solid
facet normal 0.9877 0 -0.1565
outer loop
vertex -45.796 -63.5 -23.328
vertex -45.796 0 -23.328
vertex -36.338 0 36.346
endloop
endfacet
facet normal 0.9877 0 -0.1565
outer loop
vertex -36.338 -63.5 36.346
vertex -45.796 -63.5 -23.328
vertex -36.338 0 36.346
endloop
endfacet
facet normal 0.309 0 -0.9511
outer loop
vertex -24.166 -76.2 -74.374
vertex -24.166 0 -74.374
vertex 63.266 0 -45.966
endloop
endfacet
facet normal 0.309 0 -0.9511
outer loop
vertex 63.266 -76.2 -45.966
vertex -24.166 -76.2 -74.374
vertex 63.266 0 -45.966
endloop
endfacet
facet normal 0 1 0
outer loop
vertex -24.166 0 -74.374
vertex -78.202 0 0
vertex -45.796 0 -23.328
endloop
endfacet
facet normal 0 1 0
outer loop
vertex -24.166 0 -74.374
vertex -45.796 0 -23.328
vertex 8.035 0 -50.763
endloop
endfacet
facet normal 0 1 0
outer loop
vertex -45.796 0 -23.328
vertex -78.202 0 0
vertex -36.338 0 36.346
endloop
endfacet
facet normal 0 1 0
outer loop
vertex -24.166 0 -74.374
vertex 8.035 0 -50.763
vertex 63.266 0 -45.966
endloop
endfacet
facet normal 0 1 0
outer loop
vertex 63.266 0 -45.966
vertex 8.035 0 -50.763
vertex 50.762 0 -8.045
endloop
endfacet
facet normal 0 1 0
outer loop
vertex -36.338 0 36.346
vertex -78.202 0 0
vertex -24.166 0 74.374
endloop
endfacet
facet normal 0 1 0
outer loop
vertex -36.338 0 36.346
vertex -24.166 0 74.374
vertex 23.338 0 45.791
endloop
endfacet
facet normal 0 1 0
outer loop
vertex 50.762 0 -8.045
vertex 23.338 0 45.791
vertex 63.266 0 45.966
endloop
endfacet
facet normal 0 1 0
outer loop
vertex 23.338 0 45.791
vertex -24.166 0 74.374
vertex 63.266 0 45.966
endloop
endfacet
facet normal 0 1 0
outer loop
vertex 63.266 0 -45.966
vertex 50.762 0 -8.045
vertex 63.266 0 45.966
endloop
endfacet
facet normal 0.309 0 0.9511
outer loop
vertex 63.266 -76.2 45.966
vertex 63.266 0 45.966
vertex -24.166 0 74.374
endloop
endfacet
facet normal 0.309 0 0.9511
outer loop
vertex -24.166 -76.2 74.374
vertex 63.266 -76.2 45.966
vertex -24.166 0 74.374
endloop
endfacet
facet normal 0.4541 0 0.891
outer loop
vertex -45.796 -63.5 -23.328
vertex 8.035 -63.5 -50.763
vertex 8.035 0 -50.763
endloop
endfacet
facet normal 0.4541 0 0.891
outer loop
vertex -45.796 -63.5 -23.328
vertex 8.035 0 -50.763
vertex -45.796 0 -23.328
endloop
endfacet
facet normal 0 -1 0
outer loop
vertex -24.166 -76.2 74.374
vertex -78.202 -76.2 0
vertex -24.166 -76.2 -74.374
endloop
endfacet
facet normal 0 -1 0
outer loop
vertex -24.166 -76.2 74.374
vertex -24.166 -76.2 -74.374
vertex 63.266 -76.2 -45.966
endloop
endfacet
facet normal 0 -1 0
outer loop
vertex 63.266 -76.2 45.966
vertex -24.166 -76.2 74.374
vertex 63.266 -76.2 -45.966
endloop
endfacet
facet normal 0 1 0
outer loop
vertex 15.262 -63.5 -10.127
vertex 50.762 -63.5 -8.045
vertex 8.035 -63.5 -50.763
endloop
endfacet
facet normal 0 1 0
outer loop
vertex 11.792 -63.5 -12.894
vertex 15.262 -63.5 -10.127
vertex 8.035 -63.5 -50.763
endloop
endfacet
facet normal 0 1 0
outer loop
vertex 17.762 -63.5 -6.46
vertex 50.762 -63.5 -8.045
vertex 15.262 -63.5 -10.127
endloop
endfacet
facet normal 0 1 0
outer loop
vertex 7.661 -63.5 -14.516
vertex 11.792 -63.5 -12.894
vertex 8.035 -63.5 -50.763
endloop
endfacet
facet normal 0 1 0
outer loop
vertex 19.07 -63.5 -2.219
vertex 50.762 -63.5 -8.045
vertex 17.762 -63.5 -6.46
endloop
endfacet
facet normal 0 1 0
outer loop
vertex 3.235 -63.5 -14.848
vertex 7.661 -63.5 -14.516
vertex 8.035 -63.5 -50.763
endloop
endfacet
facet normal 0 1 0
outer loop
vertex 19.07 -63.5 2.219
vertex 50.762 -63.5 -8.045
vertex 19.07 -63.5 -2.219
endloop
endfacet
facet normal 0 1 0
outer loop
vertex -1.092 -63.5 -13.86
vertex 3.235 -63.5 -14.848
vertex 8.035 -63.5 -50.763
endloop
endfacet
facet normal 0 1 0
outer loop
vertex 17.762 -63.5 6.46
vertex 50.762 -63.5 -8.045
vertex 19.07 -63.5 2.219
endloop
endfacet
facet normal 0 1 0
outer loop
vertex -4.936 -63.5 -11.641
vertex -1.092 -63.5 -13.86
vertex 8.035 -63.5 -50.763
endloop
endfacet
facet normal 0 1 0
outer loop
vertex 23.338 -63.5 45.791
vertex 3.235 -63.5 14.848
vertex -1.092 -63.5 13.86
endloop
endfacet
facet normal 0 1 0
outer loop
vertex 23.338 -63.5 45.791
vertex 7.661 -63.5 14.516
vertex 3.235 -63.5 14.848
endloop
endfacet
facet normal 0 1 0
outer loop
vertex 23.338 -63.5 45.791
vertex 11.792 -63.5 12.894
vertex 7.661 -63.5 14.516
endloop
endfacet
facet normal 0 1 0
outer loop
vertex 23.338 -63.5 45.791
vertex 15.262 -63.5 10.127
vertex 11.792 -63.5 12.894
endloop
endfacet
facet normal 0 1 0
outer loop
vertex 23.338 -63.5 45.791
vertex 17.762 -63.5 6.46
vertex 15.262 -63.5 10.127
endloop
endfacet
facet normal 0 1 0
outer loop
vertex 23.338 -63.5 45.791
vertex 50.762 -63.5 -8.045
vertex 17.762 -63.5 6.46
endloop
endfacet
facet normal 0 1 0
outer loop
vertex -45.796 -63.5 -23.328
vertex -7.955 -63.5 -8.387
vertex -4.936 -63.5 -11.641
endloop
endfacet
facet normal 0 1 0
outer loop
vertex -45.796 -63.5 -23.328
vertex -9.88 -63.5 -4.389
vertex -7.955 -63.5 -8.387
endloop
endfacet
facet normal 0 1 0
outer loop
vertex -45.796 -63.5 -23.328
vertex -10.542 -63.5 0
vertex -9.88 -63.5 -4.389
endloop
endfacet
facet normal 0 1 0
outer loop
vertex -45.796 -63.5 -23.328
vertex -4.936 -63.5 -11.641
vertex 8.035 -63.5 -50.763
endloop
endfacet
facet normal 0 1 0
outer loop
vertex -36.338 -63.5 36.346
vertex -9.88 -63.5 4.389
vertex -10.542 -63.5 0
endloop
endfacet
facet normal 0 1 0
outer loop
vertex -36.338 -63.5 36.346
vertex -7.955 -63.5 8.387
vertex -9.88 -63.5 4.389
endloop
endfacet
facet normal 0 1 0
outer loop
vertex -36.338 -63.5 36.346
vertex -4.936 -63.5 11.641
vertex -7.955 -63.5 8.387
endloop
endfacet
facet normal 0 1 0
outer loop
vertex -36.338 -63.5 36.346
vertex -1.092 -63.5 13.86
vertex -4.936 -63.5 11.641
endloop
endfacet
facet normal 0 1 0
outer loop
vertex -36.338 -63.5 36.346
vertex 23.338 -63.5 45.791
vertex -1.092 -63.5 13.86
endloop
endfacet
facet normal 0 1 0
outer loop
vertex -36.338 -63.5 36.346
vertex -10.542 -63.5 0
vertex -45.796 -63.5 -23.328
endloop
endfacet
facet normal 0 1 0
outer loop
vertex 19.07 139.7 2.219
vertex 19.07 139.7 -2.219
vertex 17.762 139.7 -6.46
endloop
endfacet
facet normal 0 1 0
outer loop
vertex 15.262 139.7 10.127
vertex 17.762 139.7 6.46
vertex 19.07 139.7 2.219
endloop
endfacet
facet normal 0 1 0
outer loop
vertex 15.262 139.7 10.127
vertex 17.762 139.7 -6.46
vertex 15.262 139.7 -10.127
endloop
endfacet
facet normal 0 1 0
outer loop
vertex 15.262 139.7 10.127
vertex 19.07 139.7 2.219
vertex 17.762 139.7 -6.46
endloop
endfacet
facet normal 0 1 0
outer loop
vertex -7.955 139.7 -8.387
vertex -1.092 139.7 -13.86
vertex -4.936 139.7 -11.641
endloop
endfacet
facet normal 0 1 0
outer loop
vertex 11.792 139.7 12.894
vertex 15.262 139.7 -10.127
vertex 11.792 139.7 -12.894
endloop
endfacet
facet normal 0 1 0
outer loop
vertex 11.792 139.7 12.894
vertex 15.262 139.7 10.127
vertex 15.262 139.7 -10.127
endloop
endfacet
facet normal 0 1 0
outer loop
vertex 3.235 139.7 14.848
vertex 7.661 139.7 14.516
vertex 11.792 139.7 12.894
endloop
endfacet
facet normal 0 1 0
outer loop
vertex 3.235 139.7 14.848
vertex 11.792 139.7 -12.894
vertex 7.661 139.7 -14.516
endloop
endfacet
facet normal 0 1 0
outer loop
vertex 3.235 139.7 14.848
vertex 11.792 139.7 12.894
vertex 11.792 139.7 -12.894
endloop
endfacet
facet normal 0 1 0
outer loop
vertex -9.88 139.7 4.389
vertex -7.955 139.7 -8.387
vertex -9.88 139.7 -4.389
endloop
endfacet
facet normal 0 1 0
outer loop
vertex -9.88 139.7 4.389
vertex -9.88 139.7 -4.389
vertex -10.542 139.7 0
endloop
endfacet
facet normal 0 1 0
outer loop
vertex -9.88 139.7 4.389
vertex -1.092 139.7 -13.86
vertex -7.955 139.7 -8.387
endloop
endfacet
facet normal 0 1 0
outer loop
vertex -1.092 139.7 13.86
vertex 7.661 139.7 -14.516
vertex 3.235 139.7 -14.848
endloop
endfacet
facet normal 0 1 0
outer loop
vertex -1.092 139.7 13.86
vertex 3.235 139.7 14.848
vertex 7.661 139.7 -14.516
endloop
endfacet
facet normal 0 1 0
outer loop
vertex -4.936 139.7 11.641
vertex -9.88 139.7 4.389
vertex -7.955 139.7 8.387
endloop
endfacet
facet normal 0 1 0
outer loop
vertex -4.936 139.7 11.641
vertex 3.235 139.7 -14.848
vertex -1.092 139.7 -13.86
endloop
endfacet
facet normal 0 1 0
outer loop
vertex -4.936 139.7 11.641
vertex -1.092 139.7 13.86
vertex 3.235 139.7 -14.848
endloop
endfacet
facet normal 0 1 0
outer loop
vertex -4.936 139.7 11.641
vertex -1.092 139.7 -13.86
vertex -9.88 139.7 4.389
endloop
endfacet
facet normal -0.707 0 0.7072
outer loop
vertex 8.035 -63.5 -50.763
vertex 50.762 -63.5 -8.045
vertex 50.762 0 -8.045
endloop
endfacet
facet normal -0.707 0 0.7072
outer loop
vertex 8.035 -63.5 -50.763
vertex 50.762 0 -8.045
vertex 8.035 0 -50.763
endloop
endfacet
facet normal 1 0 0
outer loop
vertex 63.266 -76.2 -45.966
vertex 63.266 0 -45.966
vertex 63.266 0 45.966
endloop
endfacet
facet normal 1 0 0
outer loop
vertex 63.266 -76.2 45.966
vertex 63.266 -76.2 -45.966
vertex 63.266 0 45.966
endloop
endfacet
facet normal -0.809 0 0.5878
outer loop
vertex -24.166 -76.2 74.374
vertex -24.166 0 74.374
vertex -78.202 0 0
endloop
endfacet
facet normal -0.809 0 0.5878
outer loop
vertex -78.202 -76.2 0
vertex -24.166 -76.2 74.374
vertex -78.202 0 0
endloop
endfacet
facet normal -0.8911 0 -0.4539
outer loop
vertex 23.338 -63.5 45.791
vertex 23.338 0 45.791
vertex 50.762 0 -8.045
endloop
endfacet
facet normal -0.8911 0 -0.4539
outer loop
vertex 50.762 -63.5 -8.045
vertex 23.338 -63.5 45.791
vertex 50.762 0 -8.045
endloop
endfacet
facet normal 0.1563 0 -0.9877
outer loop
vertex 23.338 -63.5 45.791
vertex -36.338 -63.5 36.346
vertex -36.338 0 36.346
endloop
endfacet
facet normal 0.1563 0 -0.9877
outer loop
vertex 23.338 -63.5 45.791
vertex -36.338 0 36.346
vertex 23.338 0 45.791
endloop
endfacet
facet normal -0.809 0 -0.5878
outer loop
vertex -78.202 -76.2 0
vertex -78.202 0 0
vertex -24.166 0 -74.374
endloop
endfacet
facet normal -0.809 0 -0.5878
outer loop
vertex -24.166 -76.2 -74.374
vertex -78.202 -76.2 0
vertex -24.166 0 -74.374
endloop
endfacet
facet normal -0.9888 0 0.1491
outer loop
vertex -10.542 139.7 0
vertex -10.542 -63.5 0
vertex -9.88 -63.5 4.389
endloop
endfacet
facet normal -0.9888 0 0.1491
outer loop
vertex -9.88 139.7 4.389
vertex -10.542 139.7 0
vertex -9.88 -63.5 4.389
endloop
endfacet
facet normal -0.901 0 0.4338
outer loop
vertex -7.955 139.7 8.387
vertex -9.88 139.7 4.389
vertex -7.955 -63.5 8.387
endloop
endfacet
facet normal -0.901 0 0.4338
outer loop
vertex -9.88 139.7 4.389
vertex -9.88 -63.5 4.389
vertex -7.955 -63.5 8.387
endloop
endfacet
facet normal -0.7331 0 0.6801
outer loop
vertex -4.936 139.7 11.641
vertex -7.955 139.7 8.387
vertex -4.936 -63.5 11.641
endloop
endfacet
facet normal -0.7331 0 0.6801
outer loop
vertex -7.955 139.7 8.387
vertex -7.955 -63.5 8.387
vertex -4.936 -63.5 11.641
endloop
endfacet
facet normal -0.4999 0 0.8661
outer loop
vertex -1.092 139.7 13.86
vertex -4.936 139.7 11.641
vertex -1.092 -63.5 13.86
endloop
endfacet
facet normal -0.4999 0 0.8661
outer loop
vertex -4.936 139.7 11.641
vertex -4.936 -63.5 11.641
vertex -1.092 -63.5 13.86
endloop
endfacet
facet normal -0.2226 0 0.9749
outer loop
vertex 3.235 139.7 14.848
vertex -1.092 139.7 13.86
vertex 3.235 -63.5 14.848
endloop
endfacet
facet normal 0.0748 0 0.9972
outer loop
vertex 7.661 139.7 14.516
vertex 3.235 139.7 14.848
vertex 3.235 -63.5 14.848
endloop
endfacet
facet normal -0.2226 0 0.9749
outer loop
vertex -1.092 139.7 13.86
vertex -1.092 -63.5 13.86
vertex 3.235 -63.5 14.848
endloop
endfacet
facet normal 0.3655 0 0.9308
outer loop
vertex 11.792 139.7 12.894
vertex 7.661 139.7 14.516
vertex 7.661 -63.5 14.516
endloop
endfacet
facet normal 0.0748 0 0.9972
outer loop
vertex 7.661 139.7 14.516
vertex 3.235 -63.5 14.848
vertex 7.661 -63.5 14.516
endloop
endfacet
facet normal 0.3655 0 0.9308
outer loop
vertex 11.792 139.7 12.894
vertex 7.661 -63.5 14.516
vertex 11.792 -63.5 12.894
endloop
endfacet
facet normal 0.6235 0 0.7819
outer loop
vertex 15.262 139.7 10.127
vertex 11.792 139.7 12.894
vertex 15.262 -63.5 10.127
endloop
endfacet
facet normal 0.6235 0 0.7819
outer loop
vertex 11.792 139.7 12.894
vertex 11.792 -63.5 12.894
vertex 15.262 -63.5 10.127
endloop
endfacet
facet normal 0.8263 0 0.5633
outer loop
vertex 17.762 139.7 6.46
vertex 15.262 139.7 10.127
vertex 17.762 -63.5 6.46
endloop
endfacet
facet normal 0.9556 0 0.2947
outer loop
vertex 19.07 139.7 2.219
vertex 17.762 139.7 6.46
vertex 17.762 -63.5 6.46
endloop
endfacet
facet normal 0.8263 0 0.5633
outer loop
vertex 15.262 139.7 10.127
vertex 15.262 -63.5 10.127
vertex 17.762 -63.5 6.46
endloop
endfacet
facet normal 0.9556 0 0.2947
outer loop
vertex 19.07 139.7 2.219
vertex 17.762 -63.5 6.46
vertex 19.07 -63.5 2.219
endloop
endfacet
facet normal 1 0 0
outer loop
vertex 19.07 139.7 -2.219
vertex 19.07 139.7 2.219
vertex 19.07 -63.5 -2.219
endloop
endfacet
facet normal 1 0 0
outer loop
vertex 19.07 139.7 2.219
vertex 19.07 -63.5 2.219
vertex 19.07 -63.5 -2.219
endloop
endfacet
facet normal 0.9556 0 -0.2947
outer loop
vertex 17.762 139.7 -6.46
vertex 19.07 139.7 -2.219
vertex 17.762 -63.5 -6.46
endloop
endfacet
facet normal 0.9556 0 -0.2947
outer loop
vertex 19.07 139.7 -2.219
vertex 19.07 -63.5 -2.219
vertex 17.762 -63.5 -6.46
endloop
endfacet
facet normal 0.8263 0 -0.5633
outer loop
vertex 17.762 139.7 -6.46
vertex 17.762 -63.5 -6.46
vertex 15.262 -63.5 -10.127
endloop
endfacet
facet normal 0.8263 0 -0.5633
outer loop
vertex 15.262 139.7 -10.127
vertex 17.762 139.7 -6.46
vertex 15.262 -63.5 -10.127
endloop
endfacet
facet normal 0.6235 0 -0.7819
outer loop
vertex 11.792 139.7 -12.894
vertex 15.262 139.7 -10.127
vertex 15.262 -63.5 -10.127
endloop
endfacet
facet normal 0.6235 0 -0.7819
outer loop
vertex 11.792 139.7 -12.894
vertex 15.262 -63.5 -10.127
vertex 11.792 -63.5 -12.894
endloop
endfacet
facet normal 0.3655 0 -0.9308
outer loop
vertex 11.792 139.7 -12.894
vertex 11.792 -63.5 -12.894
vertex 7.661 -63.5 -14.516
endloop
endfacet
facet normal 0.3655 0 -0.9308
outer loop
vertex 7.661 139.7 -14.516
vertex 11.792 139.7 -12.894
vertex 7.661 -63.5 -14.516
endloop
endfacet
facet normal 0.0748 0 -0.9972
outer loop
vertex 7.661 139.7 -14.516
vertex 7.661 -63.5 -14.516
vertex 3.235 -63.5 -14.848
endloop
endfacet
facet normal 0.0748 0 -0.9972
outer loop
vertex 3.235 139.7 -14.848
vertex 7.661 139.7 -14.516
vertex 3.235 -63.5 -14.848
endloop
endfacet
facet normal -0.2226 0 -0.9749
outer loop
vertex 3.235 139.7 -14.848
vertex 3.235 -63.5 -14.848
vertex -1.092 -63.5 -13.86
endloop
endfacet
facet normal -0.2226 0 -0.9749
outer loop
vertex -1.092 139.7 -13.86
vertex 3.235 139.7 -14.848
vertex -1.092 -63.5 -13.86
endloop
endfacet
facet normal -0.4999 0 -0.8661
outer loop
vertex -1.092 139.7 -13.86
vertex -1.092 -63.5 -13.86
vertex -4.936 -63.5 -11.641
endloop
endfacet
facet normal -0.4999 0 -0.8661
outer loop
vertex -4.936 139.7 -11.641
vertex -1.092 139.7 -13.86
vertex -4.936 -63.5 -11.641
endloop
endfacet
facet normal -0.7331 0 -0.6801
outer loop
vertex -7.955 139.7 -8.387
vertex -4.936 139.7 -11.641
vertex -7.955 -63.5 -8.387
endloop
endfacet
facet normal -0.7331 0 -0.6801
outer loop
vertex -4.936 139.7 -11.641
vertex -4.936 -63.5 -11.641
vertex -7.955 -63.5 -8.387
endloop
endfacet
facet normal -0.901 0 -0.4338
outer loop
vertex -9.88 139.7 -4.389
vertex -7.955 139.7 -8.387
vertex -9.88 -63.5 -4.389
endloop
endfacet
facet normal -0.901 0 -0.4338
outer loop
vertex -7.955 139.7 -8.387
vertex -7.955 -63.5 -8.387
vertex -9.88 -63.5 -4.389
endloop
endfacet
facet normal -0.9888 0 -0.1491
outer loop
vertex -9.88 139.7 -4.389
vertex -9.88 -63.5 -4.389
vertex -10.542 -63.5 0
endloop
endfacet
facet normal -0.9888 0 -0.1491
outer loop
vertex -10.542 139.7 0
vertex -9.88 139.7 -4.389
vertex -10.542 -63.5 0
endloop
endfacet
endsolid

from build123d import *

# Parameters (mm, degrees)
F1_DEPTH = 76.2
F3_DEPTH = 63.5
F4_R     = 14.889155
F5_DEPTH = 203.2


with BuildPart() as f1:
    # F0 (on Front) → F1 (new body)
    with BuildSketch(Plane.XZ):
        Polygon((-24.165607, 74.374091), (-78.201547, 0), (-24.165607, -74.374091), (63.266381, -45.965716), (63.266381, 45.965716), align=None)
    extrude(amount=F1_DEPTH)

    # F2 (on face) → F3 (cut)
    with BuildSketch(Plane(origin=(0, 0, 0), x_dir=(-1, 0, 0), z_dir=(0, 1, 0))):
        Polygon((-23.337874, 45.790973), (-50.761603, -8.045448), (-8.034522, -50.763333), (45.795995, -23.328017), (36.338004, 36.345826), align=None)
    extrude(amount=-F3_DEPTH, mode=Mode.SUBTRACT)

    # F4 (on face) → F5 (join)
    with BuildSketch(Plane(origin=(0, -63.5, 0), x_dir=(-1, 0, 0), z_dir=(0, 1, 0))):
        with Locations((-4.347364, 0)):
            Circle(F4_R)
    extrude(amount=F5_DEPTH)


solid = f1.part
